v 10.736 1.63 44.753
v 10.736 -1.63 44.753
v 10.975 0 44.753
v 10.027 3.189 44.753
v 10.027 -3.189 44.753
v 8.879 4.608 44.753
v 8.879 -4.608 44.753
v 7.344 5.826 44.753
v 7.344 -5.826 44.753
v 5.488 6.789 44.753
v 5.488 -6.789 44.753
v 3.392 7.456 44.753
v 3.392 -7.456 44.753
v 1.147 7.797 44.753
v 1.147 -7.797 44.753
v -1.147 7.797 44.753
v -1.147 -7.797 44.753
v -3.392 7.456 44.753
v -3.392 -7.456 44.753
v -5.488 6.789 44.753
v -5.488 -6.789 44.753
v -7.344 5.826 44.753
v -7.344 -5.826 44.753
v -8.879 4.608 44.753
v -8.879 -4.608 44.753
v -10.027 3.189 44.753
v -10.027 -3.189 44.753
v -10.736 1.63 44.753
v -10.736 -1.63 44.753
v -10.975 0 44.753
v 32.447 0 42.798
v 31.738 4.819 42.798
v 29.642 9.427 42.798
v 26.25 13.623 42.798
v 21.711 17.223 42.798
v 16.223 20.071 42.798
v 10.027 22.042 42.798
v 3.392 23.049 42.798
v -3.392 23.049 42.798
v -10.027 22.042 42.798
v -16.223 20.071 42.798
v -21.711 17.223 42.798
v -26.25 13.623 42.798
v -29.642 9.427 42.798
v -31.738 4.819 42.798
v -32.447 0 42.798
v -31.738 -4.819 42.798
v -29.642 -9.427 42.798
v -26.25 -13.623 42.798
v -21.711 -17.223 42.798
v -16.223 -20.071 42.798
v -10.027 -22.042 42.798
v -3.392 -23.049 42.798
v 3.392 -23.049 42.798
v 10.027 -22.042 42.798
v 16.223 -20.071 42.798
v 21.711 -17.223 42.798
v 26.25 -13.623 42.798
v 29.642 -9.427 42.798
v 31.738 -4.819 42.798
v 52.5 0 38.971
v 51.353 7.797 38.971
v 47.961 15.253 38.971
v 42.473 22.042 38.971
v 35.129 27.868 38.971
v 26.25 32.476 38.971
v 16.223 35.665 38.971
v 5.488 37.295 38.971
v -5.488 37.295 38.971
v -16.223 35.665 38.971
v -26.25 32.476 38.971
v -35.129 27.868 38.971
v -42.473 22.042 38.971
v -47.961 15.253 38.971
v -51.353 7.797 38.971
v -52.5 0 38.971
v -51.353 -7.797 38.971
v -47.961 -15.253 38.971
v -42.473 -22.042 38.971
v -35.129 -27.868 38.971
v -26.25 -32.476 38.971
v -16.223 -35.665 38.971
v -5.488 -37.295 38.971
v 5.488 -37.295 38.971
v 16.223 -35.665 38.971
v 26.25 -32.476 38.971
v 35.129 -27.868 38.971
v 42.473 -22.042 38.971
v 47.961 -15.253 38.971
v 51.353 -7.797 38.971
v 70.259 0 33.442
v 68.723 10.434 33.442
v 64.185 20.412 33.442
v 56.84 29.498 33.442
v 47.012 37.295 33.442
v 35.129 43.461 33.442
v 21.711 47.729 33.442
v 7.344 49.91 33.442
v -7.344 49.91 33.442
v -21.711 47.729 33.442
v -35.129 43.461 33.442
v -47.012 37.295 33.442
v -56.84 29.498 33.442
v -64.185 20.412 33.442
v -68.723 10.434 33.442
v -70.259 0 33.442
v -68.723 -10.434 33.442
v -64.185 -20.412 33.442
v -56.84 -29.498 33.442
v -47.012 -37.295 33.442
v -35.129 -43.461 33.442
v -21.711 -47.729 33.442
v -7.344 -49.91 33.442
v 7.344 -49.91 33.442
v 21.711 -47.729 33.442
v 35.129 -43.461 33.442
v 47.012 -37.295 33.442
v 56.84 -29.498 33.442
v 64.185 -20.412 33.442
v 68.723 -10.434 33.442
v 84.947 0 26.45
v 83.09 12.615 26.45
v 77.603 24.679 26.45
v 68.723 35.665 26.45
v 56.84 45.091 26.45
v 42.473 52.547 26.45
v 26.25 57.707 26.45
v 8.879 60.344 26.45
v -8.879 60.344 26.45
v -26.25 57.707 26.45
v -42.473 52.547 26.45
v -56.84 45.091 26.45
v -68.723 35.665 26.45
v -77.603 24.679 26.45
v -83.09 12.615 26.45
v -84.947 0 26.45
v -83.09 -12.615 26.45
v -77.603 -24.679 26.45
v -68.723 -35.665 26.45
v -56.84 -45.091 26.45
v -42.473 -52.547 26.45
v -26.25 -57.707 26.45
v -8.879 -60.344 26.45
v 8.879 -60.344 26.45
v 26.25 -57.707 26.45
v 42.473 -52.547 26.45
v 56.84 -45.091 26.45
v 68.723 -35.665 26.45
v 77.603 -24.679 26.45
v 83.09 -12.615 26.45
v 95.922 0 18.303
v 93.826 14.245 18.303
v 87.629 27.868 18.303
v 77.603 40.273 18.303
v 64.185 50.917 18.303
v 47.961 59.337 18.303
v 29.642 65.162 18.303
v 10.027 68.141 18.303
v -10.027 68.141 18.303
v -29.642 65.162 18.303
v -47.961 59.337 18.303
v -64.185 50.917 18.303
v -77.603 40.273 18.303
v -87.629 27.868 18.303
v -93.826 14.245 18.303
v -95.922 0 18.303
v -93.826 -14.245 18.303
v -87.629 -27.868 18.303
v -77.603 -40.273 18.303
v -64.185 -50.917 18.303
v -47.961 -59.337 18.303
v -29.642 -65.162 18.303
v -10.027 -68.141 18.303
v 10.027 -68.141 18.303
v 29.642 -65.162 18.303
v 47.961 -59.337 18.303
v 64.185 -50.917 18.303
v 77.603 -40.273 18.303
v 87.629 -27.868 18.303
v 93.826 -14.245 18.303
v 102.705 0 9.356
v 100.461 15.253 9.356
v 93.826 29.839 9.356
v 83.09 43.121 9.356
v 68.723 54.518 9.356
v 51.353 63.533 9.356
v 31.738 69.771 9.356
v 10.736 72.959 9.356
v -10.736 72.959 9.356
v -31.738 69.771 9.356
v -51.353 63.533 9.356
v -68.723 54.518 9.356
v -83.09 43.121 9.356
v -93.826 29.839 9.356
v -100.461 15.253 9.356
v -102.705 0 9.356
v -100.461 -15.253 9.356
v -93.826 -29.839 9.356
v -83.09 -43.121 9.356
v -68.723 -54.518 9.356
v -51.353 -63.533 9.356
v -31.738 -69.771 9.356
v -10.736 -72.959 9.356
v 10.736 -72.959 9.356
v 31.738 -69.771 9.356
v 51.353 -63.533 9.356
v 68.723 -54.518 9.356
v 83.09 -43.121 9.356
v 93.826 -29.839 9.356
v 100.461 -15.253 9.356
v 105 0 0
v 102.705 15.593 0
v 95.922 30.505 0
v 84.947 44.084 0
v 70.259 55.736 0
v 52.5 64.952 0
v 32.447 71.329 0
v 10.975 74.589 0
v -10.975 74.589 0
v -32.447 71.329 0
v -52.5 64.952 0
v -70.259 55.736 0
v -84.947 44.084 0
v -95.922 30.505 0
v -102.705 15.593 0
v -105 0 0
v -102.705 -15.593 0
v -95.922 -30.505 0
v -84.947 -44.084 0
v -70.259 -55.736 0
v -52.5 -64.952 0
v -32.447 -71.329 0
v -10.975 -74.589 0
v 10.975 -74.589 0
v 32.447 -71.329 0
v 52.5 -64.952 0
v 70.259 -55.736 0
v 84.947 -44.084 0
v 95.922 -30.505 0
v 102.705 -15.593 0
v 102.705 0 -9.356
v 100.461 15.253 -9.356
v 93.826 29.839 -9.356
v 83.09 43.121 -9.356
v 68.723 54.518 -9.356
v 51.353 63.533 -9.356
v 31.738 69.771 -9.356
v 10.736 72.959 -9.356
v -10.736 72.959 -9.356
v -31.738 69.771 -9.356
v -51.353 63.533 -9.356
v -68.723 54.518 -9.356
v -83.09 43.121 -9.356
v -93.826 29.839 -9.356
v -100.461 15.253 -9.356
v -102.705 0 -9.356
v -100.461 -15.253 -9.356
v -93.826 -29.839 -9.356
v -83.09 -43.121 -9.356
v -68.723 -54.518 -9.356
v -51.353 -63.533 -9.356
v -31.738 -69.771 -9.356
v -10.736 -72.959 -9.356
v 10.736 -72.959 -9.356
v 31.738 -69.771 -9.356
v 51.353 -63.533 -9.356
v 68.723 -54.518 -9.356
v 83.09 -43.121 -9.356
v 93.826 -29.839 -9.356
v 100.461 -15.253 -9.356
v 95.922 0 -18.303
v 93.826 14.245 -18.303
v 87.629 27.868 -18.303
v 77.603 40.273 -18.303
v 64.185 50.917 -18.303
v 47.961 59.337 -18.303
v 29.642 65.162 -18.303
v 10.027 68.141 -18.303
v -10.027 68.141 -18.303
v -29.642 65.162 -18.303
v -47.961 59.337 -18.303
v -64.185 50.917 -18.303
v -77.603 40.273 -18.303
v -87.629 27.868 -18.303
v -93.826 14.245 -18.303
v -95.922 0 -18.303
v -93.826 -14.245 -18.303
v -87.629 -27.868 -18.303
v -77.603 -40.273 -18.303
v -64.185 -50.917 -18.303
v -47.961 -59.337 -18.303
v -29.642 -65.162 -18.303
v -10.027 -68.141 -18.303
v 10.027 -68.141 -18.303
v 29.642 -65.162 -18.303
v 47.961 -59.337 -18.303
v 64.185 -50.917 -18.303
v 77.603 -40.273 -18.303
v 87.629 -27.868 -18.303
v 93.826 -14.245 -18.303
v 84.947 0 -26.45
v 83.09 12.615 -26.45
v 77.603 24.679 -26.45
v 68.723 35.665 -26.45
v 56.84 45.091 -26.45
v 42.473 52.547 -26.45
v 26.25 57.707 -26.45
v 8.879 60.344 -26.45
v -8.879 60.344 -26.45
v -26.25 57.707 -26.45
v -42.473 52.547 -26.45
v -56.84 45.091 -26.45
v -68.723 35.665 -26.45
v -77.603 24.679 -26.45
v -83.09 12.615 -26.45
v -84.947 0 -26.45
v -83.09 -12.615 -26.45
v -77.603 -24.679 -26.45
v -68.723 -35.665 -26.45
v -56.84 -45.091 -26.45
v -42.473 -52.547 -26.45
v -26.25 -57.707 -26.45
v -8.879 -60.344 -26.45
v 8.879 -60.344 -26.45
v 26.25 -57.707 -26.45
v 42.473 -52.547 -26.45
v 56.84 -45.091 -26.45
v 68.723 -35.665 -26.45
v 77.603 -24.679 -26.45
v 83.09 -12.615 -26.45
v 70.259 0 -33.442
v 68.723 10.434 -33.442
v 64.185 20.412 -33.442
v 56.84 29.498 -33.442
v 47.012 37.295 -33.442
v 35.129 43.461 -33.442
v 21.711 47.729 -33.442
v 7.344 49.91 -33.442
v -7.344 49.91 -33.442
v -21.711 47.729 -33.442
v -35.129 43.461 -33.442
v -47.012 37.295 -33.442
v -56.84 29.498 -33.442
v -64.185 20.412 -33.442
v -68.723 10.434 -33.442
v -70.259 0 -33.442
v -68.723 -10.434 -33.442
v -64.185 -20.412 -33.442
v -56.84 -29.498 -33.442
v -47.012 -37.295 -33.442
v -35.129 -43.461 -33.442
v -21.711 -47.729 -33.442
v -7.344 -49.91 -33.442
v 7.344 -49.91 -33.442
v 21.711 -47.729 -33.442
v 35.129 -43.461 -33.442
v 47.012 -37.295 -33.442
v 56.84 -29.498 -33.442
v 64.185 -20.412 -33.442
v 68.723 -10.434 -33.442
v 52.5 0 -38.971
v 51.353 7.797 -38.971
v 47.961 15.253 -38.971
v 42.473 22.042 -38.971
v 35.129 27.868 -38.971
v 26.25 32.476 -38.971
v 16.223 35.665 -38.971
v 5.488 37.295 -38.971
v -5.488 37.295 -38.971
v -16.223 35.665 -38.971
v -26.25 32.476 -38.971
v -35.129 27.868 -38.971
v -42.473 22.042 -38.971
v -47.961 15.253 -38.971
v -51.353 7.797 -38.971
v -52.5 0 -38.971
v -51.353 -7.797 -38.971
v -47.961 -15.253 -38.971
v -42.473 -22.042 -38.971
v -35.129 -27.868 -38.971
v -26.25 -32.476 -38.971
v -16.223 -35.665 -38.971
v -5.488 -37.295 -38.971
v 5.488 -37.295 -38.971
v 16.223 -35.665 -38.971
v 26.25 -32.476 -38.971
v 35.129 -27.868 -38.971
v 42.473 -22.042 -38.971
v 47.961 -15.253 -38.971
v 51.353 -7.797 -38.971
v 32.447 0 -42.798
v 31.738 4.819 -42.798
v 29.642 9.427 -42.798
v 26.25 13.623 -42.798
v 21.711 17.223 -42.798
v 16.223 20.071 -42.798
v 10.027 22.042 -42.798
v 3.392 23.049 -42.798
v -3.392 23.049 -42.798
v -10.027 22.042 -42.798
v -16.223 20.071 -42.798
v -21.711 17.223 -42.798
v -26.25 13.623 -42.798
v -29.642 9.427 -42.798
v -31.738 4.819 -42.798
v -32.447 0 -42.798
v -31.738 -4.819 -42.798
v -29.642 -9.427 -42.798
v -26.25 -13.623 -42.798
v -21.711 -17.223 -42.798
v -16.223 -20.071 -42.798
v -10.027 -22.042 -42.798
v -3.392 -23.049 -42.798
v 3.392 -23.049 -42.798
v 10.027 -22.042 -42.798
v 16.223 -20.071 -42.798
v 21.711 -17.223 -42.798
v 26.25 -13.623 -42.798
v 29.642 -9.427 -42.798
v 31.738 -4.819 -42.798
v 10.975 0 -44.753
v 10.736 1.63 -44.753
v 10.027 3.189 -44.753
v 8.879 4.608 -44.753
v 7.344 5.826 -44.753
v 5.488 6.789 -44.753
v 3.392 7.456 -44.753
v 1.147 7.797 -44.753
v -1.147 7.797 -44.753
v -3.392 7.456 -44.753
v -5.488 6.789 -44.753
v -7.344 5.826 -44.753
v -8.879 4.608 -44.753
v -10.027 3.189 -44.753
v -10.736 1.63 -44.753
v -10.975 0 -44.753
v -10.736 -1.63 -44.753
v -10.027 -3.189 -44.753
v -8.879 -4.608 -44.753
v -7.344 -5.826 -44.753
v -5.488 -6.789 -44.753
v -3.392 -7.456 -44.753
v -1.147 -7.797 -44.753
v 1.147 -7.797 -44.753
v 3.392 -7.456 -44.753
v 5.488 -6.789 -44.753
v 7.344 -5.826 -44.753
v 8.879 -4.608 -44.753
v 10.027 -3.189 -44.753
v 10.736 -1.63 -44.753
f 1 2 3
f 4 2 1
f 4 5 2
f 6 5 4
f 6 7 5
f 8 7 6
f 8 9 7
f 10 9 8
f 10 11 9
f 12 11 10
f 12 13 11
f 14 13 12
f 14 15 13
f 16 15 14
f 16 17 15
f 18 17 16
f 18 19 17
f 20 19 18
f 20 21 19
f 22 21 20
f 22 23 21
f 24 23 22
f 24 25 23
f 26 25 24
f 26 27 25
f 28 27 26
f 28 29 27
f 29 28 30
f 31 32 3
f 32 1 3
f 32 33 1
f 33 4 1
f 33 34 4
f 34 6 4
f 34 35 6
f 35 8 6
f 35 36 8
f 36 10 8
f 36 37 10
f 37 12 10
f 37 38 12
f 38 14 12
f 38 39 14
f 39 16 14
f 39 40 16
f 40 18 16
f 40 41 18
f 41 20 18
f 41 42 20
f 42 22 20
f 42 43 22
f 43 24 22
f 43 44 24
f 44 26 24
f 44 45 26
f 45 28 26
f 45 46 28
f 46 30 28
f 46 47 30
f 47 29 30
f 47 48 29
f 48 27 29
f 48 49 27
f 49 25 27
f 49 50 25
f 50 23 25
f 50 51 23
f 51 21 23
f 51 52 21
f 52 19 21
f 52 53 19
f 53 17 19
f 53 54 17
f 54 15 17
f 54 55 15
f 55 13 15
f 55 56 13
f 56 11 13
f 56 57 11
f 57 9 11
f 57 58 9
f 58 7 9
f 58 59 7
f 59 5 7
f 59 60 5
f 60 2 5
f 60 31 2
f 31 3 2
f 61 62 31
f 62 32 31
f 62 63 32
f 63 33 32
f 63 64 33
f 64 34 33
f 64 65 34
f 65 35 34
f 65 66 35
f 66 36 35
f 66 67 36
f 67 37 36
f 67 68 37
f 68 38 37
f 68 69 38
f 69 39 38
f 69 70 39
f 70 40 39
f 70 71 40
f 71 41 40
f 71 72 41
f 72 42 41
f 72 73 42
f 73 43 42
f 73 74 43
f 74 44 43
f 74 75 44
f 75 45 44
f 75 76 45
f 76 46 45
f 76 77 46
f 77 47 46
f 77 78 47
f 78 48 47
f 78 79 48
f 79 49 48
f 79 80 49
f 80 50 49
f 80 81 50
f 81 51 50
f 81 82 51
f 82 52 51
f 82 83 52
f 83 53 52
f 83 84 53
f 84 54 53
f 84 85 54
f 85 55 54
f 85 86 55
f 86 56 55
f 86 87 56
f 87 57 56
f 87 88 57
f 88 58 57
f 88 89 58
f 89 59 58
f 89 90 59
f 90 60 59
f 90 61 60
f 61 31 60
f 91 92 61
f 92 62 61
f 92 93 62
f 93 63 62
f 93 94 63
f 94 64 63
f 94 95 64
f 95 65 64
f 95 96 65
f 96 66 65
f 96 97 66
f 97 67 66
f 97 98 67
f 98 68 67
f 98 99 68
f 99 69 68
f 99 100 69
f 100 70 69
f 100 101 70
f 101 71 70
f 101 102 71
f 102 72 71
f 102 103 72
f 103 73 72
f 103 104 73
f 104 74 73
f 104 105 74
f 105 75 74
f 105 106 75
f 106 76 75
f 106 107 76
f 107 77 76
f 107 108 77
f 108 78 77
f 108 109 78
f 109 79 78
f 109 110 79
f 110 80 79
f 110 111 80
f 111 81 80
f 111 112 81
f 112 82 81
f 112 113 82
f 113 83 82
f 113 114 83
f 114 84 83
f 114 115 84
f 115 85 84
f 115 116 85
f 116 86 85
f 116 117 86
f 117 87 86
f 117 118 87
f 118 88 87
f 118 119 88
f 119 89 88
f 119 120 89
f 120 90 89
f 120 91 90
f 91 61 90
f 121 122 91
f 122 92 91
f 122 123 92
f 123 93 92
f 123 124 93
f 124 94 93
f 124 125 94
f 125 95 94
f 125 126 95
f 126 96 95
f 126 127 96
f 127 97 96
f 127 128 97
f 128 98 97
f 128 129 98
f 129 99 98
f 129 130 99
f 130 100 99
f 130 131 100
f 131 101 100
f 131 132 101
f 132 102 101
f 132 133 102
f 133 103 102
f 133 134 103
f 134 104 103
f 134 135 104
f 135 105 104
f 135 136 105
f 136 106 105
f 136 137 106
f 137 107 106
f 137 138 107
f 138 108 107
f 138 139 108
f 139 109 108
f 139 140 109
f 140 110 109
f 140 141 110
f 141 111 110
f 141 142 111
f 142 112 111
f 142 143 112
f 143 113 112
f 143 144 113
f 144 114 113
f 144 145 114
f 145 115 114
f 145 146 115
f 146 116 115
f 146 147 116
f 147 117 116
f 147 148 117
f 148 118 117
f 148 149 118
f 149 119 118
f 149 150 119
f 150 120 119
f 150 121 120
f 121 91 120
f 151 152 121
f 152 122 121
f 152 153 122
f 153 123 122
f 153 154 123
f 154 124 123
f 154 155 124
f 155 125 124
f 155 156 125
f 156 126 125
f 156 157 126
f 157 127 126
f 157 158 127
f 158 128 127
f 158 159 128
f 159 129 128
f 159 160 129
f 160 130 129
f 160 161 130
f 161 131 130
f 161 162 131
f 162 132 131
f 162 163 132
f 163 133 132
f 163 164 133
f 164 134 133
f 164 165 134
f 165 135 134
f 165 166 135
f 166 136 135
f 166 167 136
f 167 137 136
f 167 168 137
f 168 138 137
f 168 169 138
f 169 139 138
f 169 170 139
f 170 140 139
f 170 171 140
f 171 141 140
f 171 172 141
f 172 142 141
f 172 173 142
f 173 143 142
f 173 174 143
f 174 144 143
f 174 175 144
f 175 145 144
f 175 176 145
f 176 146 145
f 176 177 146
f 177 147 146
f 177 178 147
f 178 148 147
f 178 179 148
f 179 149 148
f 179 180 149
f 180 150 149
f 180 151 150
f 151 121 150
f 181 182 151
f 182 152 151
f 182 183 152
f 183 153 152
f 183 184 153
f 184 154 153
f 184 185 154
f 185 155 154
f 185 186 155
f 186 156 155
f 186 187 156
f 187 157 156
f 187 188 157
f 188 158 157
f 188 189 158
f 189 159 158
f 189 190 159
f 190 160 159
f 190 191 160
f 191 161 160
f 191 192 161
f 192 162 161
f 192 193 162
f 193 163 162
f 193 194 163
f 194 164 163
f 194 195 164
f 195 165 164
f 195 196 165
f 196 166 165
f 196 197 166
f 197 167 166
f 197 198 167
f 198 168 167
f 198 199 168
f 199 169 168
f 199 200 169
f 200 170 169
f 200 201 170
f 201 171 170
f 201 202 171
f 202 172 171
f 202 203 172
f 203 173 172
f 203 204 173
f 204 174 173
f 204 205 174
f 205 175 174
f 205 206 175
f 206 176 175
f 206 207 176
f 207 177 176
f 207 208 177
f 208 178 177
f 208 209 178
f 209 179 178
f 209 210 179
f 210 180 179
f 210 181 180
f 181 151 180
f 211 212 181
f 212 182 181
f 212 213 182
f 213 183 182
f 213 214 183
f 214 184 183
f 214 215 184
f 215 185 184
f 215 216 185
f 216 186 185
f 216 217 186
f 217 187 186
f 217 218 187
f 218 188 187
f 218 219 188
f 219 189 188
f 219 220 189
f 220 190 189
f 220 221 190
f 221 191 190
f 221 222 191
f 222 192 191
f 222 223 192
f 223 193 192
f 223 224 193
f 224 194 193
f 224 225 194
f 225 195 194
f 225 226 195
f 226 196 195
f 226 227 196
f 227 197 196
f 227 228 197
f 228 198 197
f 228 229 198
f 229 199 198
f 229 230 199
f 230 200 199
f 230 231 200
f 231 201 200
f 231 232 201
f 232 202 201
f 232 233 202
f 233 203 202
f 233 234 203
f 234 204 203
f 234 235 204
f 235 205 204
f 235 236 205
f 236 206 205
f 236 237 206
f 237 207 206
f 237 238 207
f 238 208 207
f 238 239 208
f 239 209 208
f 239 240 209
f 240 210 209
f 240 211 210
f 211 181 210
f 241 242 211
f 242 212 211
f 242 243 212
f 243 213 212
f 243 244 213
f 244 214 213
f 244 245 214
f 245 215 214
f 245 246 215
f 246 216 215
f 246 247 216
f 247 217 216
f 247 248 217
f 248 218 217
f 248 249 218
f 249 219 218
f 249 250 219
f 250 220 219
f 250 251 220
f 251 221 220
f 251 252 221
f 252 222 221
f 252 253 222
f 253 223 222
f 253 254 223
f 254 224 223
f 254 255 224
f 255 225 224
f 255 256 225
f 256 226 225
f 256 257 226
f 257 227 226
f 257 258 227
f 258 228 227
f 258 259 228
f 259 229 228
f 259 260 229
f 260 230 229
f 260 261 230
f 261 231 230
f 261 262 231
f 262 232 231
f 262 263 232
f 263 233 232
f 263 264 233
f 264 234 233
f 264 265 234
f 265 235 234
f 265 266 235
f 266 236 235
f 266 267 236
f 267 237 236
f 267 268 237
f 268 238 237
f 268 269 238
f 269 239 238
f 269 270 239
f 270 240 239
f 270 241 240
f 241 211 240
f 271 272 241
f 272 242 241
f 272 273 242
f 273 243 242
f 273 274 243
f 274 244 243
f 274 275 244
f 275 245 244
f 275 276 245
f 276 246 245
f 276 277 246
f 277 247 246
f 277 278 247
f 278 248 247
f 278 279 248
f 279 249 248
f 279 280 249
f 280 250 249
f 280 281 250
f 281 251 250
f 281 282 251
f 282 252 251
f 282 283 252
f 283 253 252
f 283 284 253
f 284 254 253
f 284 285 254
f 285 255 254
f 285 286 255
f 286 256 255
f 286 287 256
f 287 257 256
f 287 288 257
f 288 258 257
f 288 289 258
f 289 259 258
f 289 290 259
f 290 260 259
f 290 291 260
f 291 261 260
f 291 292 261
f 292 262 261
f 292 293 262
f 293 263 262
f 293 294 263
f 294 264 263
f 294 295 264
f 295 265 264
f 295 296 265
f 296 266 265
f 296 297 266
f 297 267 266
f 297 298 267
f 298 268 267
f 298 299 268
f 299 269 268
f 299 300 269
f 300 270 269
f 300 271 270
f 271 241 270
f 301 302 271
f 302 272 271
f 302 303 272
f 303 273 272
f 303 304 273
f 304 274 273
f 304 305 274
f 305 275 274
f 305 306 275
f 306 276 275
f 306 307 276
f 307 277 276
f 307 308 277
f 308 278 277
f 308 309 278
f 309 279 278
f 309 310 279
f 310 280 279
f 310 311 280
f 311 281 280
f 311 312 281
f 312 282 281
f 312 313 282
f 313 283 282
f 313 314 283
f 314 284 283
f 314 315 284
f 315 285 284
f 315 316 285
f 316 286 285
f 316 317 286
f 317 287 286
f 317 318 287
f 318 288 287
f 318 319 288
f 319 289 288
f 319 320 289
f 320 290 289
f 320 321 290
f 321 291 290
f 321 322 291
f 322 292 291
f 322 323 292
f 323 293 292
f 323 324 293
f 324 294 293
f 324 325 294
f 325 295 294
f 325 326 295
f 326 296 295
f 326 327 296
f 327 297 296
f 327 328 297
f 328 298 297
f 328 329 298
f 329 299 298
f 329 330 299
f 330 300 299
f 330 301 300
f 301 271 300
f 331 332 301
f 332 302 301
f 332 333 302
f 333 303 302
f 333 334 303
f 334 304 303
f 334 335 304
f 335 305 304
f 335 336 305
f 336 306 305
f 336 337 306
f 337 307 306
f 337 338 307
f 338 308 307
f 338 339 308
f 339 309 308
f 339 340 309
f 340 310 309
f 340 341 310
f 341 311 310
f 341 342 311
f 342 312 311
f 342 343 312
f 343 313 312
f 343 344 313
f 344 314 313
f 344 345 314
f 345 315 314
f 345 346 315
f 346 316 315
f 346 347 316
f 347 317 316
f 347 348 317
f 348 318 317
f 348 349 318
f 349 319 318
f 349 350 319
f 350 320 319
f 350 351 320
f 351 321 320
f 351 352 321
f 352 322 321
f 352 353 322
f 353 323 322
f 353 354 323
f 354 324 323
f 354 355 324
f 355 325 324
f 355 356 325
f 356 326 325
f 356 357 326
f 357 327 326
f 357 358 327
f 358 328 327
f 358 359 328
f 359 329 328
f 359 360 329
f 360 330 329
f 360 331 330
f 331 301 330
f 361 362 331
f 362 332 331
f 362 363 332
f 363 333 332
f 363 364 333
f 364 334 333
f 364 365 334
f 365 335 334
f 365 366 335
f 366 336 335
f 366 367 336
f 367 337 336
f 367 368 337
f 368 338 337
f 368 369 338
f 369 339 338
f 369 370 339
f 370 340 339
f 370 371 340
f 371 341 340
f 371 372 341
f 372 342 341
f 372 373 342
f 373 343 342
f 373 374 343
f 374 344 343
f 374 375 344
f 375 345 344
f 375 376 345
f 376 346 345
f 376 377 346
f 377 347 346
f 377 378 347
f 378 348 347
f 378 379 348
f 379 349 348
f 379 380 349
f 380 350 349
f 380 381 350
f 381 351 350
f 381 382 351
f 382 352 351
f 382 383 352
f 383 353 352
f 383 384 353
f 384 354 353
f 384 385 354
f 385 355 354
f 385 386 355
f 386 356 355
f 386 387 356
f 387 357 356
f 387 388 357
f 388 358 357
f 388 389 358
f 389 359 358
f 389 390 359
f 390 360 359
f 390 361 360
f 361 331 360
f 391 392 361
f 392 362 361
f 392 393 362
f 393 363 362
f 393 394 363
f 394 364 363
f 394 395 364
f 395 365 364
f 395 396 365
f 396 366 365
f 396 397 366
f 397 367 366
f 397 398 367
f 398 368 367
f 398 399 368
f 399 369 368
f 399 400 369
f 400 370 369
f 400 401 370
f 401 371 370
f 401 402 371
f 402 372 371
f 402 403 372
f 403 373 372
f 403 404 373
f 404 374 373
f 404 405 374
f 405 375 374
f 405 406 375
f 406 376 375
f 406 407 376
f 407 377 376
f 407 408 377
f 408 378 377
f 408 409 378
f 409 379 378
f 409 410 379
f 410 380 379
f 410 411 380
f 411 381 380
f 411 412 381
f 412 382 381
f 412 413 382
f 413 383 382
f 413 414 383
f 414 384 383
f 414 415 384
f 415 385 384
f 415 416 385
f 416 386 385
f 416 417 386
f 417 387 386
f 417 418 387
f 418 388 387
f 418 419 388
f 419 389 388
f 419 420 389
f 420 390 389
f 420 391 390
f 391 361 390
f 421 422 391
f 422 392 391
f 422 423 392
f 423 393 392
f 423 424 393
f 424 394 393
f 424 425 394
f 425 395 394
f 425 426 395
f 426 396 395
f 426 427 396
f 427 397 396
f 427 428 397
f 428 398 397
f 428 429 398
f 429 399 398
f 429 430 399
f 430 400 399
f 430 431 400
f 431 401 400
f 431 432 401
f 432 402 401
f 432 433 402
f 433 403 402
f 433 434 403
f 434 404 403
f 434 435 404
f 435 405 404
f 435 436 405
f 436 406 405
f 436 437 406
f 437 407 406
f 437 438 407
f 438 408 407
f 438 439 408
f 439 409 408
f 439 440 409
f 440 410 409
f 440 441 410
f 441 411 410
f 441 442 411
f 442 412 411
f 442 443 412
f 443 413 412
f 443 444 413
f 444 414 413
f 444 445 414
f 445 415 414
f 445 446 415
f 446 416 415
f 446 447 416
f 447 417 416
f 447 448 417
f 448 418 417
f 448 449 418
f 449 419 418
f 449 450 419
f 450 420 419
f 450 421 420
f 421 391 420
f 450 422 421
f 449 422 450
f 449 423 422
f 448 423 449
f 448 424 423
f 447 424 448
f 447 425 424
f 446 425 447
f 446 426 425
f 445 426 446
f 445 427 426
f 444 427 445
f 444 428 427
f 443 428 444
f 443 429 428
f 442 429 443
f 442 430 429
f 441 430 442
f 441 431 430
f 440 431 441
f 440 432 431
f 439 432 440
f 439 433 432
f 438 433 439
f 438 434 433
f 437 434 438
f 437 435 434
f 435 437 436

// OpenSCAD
// Generated by SolidPython 1.0.1 on 2020-07-29 00:46:47


scale(v = [7, 5, 3]) {
	sphere(r = 15);
}
/***********************************************
*********      SolidPython code:      **********
************************************************
 
# import packages: SolidPython
from solid import *
from solid.utils import *
from itertools import chain, combinations, permutations


class Resize:

    def __init__(self, scad_file):
        self.scad_file = scad_file
        #self.scad_file = import_scad(scad_file)
        # cone/cylinder param:
        self.r1 = 0
        self.r2 = 0
        self.h = 0
        # rectangular prism param:
        self.w = 0
        self.l = 0
        # ellipse param:
        self.r = 0

    # import OpenScad code (file name corresponds to shape)


    # classify shape + parameters
    def assign(self, param1, param2, param3):
        if self.scad_file == 'cone.scad':
            self.r1 = param1
            self.r2 = param2
            self.h = param3
        elif self.scad_file == 'cylinder.scad':
            self.r1 = param1
            self.r2 = param2
            self.h = param3
        elif self.scad_file == 'rectangularPrism.scad':
            self.h = param1
            self.l = param2
            self.w = param3
        else:
            self.r = param1
            self.h = param2

    # resize parameters
    def iterate(self):
        x = range(3, 20, 2)
        i = 1
        if self.scad_file == 'cone.scad':
            tempList = list(permutations(x, 2))
            for temp in tempList:
                param1 = temp[0]
                param2 = temp[1]
                filepath = 'produced_scad_files/' + 'cone' + str(param1) + '_' + str(param2) + '_' + '.scad'
                scad_render_to_file(cylinder(h=param1, r1=param2, r2=0), filepath)

        elif self.scad_file == 'cylinder.scad':
            tempList = list(permutations(x, 3))
            for temp in tempList:
                param1 = temp[0]
                param2 = temp[1]
                filepath = 'produced_scad_files/' + 'cylinder' + str(param1) + '_' + str(param2) + '_' + '.scad'
                scad_render_to_file(cylinder(h=param1, r1=param2, r2=param2), filepath)

        elif self.scad_file == 'rectangularPrism.scad':
            tempList = list(permutations(x, 3))
            for temp in tempList:
                param1 = temp[0]
                param2 = temp[1]
                param3 = temp[2]
                filepath = 'produced_scad_files/' + 'rectangularPrism' + str(param1) + '_' + str(param2) + '_' + str(
                    param3) + '.scad'
                scad_render_to_file(cube(size=(param1, param2, param3)), filepath)

        elif self.scad_file == 'ellipse.scad':
            tempList = list(permutations(x, 4))
            for temp in tempList:
                param1 = temp[0]
                param2 = temp[1]
                param3 = temp[2]
                param4 = temp[3]
                filepath = 'produced_scad_files/' + 'ellipse' + str(param1) + '_' + str(param2) + '_' + str(param3) + '_' + str(param4) + '.scad'
                scad_render_to_file(scale([param1, param2, param3])(sphere(r=param4)), filepath)

    def render_to_scadfile(self):
        scad_render_to_file(scad, 'example.scad') 
 
************************************************/
